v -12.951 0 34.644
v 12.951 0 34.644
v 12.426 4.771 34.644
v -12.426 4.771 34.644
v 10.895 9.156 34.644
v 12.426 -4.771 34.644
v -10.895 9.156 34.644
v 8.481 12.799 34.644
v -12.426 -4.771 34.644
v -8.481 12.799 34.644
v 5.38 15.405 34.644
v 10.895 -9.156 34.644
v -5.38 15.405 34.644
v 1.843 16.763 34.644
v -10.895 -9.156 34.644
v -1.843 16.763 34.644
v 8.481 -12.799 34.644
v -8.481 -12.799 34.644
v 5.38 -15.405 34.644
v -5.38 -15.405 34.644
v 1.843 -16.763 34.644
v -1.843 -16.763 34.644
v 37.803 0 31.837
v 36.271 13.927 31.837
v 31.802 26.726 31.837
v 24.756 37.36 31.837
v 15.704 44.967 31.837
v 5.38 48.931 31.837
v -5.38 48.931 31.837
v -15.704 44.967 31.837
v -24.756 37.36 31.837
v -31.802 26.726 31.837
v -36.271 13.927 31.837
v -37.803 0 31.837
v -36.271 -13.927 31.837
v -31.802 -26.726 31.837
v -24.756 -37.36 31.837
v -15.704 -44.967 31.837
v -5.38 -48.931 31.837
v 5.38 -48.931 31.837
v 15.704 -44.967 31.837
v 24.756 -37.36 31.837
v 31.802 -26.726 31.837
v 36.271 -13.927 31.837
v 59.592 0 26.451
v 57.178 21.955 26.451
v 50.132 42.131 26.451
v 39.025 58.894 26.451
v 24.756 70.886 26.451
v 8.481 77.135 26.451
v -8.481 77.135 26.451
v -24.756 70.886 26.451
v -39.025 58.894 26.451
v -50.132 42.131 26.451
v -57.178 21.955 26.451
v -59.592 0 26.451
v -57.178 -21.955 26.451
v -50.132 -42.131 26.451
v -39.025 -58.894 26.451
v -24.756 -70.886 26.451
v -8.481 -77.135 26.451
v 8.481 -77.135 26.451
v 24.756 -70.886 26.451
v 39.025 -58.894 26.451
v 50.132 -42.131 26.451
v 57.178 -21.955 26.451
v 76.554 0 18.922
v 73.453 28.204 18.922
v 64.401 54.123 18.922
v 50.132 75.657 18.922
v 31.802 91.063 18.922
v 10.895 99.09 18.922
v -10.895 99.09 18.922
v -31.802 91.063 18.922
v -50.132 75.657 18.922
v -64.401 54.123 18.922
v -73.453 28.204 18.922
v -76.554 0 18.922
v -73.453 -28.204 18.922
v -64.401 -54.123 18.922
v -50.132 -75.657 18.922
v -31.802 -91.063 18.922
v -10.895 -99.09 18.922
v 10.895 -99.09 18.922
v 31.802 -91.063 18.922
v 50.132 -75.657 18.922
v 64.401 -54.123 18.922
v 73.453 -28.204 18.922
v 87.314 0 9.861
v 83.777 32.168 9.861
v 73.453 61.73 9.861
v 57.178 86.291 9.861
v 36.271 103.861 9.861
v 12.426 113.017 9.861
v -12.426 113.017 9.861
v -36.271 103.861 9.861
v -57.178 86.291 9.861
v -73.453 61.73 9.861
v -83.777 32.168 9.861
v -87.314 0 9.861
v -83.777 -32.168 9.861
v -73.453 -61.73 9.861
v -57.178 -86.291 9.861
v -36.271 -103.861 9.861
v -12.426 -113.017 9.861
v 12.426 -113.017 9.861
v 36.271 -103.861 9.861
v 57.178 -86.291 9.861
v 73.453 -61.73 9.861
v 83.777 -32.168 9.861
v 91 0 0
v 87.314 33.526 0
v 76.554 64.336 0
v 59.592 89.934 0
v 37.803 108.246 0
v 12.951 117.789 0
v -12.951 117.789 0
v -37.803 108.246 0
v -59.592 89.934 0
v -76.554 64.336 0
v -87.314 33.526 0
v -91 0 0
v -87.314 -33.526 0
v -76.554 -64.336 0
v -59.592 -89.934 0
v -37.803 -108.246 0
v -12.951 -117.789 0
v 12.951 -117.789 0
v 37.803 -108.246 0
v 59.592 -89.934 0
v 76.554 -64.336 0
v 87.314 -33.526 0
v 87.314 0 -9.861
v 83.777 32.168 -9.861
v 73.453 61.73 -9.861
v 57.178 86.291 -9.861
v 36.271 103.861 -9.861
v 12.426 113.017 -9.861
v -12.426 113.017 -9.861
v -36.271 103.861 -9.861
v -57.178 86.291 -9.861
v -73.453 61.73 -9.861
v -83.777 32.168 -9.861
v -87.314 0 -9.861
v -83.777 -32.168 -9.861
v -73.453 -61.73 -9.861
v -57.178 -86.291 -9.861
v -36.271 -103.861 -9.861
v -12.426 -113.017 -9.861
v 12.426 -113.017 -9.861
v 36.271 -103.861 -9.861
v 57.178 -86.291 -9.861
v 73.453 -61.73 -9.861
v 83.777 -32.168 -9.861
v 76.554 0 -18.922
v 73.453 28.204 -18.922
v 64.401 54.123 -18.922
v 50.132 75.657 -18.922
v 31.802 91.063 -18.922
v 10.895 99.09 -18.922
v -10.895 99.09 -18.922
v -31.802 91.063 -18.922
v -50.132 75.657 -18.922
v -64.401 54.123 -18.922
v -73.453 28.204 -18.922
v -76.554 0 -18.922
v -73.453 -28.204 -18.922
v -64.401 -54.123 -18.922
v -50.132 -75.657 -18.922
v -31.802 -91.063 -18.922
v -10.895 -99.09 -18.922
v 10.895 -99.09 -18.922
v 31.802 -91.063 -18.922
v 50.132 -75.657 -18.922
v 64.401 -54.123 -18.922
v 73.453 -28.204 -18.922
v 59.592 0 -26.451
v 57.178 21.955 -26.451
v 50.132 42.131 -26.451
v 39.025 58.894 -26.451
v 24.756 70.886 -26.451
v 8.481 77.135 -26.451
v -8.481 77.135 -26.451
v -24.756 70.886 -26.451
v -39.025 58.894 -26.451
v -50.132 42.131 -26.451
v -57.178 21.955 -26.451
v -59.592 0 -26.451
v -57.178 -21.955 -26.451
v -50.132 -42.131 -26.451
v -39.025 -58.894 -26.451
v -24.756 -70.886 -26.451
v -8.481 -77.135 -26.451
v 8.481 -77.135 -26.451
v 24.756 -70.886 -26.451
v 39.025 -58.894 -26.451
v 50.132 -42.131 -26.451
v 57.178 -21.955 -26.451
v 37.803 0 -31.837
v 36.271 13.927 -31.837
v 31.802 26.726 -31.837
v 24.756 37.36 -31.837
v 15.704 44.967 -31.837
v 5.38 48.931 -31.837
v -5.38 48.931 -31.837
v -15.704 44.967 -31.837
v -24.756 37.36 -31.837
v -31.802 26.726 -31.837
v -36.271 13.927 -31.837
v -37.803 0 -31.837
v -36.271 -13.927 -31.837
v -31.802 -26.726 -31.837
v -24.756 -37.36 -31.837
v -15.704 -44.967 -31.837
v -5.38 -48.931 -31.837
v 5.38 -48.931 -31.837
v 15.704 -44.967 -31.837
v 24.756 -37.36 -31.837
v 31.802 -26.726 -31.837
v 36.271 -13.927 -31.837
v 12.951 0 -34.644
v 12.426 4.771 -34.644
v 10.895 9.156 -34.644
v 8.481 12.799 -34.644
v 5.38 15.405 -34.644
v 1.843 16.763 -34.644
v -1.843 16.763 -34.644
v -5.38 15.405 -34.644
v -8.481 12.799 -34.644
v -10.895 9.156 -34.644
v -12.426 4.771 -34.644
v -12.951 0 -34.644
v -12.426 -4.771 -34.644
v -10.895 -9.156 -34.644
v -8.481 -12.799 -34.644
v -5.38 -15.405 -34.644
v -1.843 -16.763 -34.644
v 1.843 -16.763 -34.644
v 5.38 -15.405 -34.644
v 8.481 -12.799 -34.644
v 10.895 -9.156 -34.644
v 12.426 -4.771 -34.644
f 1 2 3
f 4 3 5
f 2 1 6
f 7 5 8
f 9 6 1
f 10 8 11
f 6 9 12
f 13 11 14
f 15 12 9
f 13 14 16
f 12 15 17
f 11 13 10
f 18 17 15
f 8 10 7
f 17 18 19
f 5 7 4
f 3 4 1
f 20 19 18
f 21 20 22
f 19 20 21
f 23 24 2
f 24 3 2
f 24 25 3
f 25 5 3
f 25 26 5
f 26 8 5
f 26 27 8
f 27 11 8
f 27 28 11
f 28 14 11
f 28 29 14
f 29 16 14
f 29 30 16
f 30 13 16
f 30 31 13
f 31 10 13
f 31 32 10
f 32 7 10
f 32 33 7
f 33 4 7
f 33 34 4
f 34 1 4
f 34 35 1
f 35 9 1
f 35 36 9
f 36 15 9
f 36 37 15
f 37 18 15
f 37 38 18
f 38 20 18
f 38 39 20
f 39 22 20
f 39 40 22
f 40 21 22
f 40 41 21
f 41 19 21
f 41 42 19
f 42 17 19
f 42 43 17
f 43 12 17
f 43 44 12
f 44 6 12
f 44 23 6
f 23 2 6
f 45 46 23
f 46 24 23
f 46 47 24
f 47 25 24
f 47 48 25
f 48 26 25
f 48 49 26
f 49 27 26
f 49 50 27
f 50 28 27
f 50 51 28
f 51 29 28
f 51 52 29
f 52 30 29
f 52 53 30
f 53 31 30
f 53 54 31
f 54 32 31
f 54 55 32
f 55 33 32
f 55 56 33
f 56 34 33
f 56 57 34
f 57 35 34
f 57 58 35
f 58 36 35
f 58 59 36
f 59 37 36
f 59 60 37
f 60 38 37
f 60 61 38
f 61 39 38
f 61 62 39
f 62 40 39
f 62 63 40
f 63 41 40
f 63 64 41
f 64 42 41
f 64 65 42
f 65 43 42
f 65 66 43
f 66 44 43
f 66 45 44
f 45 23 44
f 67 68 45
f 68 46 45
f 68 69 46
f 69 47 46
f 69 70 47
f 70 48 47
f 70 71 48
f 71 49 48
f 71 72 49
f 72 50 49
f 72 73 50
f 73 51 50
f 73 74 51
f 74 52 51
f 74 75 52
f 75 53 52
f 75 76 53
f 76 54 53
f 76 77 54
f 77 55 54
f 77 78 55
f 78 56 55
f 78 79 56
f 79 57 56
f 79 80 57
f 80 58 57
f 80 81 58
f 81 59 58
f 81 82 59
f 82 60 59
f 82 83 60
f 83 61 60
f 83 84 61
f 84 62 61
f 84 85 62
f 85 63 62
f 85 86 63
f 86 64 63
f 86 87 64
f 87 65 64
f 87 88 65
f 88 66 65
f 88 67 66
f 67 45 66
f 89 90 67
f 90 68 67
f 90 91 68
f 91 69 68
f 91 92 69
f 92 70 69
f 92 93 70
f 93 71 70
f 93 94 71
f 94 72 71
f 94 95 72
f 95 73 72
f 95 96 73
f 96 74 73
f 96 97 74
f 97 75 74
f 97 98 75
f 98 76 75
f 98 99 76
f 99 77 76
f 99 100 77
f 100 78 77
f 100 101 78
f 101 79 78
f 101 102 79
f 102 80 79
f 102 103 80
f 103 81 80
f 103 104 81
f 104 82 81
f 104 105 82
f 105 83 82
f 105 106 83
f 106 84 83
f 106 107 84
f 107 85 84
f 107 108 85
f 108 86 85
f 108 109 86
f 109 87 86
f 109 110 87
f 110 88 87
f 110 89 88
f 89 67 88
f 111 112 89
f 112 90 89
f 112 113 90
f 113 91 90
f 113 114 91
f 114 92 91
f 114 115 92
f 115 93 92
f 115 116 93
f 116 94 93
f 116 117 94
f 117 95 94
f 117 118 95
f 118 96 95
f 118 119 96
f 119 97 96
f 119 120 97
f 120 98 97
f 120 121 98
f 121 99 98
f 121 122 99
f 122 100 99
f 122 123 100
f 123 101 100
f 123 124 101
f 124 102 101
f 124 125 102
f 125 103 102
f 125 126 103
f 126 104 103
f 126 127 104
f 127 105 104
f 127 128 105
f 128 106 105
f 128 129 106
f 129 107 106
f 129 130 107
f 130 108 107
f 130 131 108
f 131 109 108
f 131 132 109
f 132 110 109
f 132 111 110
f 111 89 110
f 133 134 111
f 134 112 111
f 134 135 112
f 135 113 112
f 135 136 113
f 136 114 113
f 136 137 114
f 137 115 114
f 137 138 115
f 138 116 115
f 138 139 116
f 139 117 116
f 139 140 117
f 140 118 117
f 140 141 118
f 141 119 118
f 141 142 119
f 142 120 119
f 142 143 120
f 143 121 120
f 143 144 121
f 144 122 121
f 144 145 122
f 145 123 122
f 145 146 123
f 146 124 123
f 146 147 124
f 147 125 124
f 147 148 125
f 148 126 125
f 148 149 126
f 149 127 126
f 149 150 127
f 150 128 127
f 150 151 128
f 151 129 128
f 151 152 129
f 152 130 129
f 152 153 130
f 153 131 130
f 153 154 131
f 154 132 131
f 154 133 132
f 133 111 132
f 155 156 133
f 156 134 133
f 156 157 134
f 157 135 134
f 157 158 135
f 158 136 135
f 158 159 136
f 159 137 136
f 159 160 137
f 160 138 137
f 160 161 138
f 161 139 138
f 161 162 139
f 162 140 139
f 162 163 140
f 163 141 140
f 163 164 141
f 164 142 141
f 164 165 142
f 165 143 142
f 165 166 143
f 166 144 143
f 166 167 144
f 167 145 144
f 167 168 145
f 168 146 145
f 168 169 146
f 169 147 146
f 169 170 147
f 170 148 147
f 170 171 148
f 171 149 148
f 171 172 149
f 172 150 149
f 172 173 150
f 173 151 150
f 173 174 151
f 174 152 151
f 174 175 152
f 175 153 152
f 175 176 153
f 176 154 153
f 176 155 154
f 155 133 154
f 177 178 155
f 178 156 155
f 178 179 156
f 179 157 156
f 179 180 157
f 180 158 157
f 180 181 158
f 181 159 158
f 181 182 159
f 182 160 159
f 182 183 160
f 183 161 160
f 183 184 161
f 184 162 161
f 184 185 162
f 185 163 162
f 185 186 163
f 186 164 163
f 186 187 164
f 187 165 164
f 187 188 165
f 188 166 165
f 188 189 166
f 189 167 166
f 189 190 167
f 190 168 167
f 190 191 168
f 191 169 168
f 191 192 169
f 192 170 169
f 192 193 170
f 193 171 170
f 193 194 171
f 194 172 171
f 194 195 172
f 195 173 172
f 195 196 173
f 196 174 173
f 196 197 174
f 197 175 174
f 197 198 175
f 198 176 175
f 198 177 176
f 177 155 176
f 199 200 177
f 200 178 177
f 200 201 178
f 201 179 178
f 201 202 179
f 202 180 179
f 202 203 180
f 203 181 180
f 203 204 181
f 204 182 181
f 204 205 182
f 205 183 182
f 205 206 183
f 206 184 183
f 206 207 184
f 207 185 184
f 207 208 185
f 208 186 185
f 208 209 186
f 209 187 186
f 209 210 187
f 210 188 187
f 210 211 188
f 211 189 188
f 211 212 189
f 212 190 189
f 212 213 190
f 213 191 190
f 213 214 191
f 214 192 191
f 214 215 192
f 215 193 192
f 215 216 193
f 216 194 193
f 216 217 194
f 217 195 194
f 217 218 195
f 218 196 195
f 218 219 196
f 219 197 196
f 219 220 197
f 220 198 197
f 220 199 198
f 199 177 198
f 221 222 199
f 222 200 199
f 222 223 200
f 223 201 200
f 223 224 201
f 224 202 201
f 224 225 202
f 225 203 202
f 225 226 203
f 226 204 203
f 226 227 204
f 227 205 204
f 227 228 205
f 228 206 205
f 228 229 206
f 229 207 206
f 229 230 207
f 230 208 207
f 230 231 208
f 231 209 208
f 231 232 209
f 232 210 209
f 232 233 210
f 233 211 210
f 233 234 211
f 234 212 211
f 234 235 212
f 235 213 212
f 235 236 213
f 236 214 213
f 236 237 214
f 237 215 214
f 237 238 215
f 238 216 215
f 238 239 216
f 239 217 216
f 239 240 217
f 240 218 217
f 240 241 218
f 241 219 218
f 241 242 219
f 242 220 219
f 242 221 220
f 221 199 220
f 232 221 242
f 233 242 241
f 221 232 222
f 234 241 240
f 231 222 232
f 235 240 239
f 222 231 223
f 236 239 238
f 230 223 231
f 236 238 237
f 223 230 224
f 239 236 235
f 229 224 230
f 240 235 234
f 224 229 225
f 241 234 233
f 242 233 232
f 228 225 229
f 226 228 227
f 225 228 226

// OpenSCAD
// Generated by SolidPython 1.0.1 on 2020-07-29 00:46:51


scale(v = [13, 17, 5]) {
	sphere(r = 7);
}
/***********************************************
*********      SolidPython code:      **********
************************************************
 
# import packages: SolidPython
from solid import *
from solid.utils import *
from itertools import chain, combinations, permutations


class Resize:

    def __init__(self, scad_file):
        self.scad_file = scad_file
        #self.scad_file = import_scad(scad_file)
        # cone/cylinder param:
        self.r1 = 0
        self.r2 = 0
        self.h = 0
        # rectangular prism param:
        self.w = 0
        self.l = 0
        # ellipse param:
        self.r = 0

    # import OpenScad code (file name corresponds to shape)


    # classify shape + parameters
    def assign(self, param1, param2, param3):
        if self.scad_file == 'cone.scad':
            self.r1 = param1
            self.r2 = param2
            self.h = param3
        elif self.scad_file == 'cylinder.scad':
            self.r1 = param1
            self.r2 = param2
            self.h = param3
        elif self.scad_file == 'rectangularPrism.scad':
            self.h = param1
            self.l = param2
            self.w = param3
        else:
            self.r = param1
            self.h = param2

    # resize parameters
    def iterate(self):
        x = range(3, 20, 2)
        i = 1
        if self.scad_file == 'cone.scad':
            tempList = list(permutations(x, 2))
            for temp in tempList:
                param1 = temp[0]
                param2 = temp[1]
                filepath = 'produced_scad_files/' + 'cone' + str(param1) + '_' + str(param2) + '_' + '.scad'
                scad_render_to_file(cylinder(h=param1, r1=param2, r2=0), filepath)

        elif self.scad_file == 'cylinder.scad':
            tempList = list(permutations(x, 3))
            for temp in tempList:
                param1 = temp[0]
                param2 = temp[1]
                filepath = 'produced_scad_files/' + 'cylinder' + str(param1) + '_' + str(param2) + '_' + '.scad'
                scad_render_to_file(cylinder(h=param1, r1=param2, r2=param2), filepath)

        elif self.scad_file == 'rectangularPrism.scad':
            tempList = list(permutations(x, 3))
            for temp in tempList:
                param1 = temp[0]
                param2 = temp[1]
                param3 = temp[2]
                filepath = 'produced_scad_files/' + 'rectangularPrism' + str(param1) + '_' + str(param2) + '_' + str(
                    param3) + '.scad'
                scad_render_to_file(cube(size=(param1, param2, param3)), filepath)

        elif self.scad_file == 'ellipse.scad':
            tempList = list(permutations(x, 4))
            for temp in tempList:
                param1 = temp[0]
                param2 = temp[1]
                param3 = temp[2]
                param4 = temp[3]
                filepath = 'produced_scad_files/' + 'ellipse' + str(param1) + '_' + str(param2) + '_' + str(param3) + '_' + str(param4) + '.scad'
                scad_render_to_file(scale([param1, param2, param3])(sphere(r=param4)), filepath)

    def render_to_scadfile(self):
        scad_render_to_file(scad, 'example.scad') 
 
************************************************/
